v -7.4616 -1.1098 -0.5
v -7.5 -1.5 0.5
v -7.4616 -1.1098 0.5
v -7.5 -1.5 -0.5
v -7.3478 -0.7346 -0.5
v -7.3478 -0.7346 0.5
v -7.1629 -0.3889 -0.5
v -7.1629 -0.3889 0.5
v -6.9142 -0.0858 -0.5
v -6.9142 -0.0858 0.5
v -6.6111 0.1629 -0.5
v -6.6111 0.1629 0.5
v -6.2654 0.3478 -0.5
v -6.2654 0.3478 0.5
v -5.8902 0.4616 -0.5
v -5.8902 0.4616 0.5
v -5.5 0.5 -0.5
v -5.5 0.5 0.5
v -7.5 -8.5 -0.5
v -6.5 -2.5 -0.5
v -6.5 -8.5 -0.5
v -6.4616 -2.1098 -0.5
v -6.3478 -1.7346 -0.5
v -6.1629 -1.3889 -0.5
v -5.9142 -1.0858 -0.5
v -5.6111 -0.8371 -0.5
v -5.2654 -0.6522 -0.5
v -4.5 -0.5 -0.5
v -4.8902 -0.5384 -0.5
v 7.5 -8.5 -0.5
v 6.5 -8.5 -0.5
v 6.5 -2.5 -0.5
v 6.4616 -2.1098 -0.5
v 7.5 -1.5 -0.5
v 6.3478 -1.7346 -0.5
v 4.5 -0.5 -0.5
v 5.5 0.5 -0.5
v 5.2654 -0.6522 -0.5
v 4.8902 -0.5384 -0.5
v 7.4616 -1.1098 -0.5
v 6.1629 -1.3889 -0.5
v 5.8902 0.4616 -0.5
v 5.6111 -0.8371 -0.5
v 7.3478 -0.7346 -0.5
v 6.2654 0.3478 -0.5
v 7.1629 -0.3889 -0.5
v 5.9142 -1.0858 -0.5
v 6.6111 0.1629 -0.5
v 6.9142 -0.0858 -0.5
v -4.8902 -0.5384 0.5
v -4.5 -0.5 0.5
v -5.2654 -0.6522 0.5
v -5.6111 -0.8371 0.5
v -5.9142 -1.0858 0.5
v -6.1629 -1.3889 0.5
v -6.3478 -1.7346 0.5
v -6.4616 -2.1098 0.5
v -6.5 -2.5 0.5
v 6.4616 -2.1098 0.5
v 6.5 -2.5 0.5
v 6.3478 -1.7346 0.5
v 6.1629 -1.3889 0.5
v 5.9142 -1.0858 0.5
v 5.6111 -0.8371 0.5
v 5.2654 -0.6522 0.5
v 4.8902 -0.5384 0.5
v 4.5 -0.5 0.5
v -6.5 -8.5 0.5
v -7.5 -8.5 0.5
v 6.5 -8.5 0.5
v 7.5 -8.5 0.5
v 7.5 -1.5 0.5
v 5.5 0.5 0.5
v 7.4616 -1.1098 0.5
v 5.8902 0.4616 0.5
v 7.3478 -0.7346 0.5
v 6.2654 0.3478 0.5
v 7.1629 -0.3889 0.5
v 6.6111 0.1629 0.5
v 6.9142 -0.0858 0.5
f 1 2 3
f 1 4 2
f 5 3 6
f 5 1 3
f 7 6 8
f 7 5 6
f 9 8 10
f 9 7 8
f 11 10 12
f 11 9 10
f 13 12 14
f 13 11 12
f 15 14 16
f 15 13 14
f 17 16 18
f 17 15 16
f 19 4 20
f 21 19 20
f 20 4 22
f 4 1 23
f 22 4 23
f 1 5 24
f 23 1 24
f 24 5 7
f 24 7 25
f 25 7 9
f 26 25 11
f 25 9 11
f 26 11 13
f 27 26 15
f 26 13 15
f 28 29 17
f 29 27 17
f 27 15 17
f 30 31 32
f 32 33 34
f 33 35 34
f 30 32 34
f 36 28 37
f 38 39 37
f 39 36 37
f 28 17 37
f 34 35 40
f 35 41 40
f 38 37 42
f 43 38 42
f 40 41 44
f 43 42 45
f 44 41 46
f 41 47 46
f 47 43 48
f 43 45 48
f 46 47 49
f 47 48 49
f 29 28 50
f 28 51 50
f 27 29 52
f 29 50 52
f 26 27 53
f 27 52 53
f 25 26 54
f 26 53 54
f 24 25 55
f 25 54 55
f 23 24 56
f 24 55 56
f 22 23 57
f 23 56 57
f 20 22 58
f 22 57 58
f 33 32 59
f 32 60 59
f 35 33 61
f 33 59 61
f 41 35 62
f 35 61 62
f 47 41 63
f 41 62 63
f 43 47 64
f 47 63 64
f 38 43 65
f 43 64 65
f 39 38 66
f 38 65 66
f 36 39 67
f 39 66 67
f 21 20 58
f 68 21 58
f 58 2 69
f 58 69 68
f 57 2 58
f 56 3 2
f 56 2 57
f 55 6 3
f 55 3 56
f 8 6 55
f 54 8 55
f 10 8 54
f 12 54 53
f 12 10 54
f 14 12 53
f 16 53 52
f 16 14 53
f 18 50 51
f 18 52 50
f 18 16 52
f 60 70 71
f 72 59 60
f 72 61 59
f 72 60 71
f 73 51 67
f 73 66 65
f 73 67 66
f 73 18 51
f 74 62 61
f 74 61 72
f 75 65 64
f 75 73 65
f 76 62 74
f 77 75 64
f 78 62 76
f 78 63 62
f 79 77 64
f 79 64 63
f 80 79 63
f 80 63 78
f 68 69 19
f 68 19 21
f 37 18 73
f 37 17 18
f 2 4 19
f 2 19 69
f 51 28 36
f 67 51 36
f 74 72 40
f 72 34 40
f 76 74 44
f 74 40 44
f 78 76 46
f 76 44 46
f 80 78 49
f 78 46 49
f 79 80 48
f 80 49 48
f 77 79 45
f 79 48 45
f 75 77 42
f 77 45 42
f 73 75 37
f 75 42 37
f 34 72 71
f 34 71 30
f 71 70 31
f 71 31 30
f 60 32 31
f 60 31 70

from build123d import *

# Parameters (mm, degrees)
SKETCH_1_W      = 15
SKETCH_1_H      = 1
EXTRUDE_1_DEPTH = 0.5
SKETCH_2_W      = 1
SKETCH_2_H      = 1
EXTRUDE_2_DEPTH = 8
FILLET_1_R      = 2


with BuildPart() as part:
    # Эскиз1 → Бобышка-Вытянуть1 (new, symmetric)
    with BuildSketch(Plane(origin=(0, 0, 0), x_dir=(1, 0, 0), z_dir=(0, 1, 0))):
        Rectangle(SKETCH_1_W, SKETCH_1_H)
    extrude(amount=EXTRUDE_1_DEPTH, both=True)

    # Эскиз2 → Бобышка-Вытянуть2 (add)
    with BuildSketch(Plane.XZ.offset(0.5)):
        with Locations((-7, 0)):
            Rectangle(SKETCH_2_W, SKETCH_2_H)
        with Locations((7, 0)):
            Rectangle(SKETCH_2_W, SKETCH_2_H)
    extrude(amount=EXTRUDE_2_DEPTH)

    # Скругление1
    fillet_1_edges = [part.edges().sort_by_distance(p)[0] for p in [
        (-7.5, 0.5, 0),
        (-6.5, -0.5, 0),
        (6.5, -0.5, 0),
        (7.5, 0.5, 0),
    ]]
    fillet(fillet_1_edges, radius=FILLET_1_R)


solid = part.part
